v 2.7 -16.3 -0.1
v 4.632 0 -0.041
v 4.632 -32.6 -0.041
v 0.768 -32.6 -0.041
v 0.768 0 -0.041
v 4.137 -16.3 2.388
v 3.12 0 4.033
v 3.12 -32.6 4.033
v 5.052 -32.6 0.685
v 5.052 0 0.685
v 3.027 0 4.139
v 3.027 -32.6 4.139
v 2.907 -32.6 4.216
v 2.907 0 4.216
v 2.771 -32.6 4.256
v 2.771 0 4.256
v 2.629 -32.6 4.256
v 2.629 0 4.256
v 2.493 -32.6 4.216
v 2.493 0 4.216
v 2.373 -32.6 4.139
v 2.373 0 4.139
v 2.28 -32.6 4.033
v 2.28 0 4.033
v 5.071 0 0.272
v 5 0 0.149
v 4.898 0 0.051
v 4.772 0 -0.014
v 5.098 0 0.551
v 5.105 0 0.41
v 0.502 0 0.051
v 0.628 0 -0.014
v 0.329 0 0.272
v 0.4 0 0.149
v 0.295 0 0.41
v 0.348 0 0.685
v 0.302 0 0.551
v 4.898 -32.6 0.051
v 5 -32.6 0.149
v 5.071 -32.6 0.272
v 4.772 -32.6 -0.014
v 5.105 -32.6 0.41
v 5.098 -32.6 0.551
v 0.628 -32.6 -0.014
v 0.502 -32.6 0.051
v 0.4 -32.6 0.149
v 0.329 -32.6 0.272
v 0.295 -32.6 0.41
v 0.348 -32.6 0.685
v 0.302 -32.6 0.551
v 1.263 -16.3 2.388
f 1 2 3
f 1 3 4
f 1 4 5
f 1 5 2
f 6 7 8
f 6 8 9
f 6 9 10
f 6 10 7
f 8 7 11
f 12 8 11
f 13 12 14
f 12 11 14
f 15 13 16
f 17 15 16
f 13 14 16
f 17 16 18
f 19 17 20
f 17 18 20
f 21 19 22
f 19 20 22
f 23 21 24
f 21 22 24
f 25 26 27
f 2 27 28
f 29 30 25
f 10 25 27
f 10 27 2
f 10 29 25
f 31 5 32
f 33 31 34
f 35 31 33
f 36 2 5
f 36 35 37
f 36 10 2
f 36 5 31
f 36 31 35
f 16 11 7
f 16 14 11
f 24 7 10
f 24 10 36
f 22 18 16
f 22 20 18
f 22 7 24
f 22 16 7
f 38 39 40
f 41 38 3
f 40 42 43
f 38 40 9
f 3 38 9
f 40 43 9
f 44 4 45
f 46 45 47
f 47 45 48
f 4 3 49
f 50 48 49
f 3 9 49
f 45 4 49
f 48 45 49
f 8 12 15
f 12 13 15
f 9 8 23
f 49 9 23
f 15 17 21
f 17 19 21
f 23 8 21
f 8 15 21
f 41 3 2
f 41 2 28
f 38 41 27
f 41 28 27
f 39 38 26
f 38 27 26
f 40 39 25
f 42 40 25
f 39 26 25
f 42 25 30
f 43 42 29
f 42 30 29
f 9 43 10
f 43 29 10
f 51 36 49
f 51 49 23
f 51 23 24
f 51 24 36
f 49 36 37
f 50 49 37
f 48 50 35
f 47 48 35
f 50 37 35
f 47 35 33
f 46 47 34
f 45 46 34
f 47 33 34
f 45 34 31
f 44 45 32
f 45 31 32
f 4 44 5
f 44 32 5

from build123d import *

# Parameters (mm, degrees)
F1_DEPTH = 32.6


with BuildPart() as f1:
    # F0 (on Front) → F1 (new body)
    with BuildSketch(Plane.XZ):
        with BuildLine():
            add(Edge.make_bspline(
                [(0.347833, 0.685448), (0.641423, 1.259751), (1.241216, 2.401075), (1.929735, 3.491173), (2.280301, 4.032581)],
                knots=[0.768058, 0.768058, 0.768058, 0.768058, 2.701851, 4.635644, 4.635644, 4.635644, 4.635644], degree=3))
            ThreePointArc((0.347833, 0.685448), (0.360019, 0.207857), (0.767532, -0.041492))
            add(Edge.make_bspline(
                [(4.632468, -0.041492), (3.988312, -0.074387), (2.7, -0.125613), (1.411688, -0.074387), (0.767532, -0.041492)],
                knots=[0.768058, 0.768058, 0.768058, 0.768058, 2.701851, 4.635644, 4.635644, 4.635644, 4.635644], degree=3))
            ThreePointArc((4.632468, -0.041492), (5.039981, 0.207857), (5.052167, 0.685448))
            add(Edge.make_bspline(
                [(3.119699, 4.032581), (3.470265, 3.491173), (4.158784, 2.401075), (4.758577, 1.259751), (5.052167, 0.685448)],
                knots=[0.768058, 0.768058, 0.768058, 0.768058, 2.701851, 4.635644, 4.635644, 4.635644, 4.635644], degree=3))
            ThreePointArc((3.119699, 4.032581), (2.7, 4.260823), (2.280301, 4.032581))
        make_face()
    extrude(amount=F1_DEPTH)


solid = f1.part
